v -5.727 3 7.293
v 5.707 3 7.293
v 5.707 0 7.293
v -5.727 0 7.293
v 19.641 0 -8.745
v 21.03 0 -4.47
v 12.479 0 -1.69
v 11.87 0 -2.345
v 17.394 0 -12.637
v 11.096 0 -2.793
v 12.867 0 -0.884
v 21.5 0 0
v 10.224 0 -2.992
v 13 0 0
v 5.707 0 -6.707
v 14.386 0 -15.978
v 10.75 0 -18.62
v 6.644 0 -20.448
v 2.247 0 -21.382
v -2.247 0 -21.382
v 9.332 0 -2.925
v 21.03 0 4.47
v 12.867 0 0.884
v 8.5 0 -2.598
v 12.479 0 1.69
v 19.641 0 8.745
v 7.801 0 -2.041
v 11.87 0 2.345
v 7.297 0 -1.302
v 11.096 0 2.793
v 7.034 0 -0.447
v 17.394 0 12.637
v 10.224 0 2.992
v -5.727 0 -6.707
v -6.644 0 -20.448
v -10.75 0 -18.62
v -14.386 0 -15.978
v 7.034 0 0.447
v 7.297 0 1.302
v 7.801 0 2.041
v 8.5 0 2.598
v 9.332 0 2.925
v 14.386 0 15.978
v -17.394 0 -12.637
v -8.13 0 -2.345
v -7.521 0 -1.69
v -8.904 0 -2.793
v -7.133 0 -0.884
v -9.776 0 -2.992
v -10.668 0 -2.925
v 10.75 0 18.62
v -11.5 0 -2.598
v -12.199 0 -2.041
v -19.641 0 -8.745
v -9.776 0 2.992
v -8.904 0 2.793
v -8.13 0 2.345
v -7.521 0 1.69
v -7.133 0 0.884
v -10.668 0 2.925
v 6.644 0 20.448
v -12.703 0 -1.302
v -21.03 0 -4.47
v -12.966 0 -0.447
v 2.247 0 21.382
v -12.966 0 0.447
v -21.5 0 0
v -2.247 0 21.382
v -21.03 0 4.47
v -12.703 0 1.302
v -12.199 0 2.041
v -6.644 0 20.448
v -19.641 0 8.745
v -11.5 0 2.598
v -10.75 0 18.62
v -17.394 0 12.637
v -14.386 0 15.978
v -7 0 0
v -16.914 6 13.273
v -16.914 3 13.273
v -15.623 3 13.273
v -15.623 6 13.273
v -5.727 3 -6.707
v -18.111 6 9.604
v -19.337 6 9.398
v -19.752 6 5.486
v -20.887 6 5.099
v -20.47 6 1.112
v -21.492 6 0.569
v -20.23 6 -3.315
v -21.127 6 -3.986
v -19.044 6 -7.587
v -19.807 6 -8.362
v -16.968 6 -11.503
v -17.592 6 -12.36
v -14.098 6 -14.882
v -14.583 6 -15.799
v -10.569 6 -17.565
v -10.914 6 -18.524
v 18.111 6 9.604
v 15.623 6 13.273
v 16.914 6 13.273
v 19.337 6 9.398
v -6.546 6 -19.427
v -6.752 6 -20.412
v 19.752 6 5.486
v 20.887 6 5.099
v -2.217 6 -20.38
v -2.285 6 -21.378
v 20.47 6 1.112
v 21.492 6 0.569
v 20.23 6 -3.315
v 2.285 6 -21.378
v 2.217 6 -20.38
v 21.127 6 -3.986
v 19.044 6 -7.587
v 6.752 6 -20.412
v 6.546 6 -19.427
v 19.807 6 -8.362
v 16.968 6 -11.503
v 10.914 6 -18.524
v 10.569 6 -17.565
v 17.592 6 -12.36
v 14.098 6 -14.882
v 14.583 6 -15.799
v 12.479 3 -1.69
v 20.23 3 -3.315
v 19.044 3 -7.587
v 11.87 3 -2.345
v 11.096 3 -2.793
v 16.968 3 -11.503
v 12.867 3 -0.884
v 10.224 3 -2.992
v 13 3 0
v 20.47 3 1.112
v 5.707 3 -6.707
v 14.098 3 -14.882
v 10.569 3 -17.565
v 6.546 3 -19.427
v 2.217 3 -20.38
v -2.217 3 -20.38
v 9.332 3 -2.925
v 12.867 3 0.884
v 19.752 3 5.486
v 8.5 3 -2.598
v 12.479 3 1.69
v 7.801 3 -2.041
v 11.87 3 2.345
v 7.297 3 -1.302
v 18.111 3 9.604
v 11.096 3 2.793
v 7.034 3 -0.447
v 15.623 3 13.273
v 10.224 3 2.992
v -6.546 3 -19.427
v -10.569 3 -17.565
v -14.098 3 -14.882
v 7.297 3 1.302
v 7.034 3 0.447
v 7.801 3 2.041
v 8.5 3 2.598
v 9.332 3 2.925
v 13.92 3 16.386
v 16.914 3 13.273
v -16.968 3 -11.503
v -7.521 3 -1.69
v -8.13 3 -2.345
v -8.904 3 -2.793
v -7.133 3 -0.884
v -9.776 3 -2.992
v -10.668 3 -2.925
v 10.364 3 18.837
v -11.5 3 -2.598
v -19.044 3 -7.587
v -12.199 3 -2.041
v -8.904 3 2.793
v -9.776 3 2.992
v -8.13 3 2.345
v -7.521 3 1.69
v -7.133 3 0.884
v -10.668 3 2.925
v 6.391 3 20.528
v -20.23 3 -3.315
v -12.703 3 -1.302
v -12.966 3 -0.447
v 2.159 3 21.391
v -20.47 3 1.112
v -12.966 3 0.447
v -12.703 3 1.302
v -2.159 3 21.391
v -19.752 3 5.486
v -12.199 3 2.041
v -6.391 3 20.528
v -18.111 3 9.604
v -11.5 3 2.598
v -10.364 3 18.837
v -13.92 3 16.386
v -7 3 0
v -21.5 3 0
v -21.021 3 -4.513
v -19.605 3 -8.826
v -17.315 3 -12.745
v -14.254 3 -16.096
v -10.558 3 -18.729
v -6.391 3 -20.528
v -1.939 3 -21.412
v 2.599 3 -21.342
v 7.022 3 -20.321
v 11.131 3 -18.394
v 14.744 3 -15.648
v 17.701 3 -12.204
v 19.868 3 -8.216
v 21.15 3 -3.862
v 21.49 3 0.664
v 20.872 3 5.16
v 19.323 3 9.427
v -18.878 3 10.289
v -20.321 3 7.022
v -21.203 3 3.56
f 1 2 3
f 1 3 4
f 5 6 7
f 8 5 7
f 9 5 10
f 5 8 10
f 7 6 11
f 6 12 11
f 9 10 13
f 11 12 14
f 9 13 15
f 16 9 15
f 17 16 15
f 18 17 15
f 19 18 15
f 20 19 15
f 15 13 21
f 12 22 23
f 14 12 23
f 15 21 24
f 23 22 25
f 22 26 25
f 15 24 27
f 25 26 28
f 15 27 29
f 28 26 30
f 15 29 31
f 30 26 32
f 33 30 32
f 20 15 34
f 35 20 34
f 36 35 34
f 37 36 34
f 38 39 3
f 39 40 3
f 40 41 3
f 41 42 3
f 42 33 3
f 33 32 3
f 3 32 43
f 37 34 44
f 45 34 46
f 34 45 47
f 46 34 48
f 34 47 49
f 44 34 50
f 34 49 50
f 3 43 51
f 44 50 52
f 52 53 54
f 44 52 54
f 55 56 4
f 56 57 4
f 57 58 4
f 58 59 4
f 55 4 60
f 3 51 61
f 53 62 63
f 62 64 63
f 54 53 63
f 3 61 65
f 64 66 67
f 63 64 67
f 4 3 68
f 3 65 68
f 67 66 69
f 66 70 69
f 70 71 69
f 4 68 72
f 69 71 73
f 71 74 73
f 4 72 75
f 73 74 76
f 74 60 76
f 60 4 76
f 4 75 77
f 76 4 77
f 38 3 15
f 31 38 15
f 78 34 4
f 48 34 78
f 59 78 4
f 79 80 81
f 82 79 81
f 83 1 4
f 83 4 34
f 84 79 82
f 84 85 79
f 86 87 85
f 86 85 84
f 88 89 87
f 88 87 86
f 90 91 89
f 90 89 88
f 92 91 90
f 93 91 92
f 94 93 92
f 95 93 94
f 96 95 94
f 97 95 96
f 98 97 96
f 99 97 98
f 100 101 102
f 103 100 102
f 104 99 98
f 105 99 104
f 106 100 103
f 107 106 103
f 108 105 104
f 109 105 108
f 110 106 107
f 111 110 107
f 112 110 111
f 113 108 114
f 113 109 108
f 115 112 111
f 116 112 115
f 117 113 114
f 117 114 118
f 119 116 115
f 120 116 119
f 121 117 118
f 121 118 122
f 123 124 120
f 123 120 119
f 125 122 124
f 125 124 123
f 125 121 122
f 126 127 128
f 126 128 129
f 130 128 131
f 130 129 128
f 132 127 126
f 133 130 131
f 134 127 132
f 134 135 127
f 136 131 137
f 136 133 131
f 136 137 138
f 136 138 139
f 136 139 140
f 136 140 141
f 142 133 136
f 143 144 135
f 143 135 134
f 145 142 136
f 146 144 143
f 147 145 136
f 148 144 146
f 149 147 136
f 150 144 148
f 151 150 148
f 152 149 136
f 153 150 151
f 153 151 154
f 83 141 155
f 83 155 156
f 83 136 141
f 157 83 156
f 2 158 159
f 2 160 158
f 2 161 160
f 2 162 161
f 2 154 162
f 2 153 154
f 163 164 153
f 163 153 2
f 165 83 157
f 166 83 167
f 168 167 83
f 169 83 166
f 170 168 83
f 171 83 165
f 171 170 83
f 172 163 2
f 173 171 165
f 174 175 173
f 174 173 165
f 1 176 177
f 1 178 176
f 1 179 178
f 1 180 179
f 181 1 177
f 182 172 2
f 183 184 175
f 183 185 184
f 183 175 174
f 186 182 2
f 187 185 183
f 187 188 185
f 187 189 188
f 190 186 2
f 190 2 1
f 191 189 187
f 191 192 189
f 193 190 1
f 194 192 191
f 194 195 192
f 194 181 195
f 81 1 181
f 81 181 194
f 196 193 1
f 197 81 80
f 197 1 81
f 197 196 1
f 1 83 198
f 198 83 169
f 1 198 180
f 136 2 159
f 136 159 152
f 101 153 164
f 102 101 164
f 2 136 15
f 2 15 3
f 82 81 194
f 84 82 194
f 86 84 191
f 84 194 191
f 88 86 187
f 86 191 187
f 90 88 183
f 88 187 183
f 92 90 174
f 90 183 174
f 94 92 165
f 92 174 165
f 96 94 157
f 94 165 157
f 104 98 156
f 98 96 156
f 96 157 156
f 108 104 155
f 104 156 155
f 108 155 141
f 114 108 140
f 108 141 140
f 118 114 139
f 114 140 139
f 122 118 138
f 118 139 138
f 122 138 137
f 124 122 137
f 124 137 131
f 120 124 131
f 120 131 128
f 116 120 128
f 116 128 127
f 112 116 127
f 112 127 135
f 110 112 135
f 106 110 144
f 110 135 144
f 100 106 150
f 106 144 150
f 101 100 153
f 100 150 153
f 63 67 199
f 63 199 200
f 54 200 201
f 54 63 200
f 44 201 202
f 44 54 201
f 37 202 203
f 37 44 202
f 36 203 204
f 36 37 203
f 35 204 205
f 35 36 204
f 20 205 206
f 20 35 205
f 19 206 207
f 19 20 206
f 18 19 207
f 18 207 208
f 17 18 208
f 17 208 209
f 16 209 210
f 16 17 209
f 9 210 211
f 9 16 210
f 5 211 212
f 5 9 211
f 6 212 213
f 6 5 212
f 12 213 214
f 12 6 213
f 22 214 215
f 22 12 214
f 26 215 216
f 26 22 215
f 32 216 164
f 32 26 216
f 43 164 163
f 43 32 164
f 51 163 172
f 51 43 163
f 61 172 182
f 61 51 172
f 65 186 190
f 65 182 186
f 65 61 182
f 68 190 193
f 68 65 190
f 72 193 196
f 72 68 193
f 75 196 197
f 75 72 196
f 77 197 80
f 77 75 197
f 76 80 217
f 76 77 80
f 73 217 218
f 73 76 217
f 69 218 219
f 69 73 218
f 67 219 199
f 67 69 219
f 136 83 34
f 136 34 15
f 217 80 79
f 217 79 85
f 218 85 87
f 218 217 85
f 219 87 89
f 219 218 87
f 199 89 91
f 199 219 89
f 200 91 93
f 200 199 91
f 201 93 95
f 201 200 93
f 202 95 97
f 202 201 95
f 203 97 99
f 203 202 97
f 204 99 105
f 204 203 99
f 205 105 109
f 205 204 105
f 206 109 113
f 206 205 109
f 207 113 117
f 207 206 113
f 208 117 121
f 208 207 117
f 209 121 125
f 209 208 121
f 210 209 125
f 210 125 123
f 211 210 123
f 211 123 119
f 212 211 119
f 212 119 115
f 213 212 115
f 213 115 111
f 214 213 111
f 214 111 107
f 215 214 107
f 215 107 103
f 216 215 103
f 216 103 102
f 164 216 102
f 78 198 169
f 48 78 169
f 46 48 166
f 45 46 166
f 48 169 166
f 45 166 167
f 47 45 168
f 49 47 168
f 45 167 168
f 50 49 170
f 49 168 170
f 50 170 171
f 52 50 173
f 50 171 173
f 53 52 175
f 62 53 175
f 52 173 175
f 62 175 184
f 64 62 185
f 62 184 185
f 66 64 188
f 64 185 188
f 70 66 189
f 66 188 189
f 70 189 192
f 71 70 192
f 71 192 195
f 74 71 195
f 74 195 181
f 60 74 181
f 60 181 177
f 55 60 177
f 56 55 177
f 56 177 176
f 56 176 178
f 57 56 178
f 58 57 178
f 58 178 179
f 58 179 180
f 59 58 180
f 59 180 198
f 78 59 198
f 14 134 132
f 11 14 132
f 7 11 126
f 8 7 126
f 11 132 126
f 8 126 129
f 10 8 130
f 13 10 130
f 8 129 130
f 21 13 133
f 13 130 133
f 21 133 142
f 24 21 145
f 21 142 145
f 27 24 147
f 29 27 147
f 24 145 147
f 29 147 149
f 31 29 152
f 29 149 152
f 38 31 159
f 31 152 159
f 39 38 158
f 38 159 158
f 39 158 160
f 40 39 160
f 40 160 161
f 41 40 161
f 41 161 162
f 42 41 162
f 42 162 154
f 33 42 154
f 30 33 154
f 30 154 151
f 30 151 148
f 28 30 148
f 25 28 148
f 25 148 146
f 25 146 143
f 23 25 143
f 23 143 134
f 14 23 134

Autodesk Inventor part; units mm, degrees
ref_plane "YZ Plane" through (0, 0, 0) normal (1, 0, 0) x (0, 1, 0)
ref_plane "XZ Plane" through (0, 0, 0) normal (0, 1, 0) x (-1, 0, 0)
ref_plane "XY Plane" through (0, 0, 0) normal (0, 0, 1) x (1, 0, 0)
sketch "Sketch1" plane through (0, 0, 0) normal (0, 1, 0) x (-1, 0, 0)
  circle A0 centre (0, 0) radius 21.5
  dimension "d1" = 43
extrude "Extrusion1" add sketch "Sketch1" along normal blind 3
sketch "Sketch2" plane through (0, 3, 0) normal (0, 1, 0) x (1, 0, 0)
  arc A0 (15.6228, -13.2732) -> (-15.6228, -13.2732) centre (0, 0) ccw
  arc A1 (16.9137, -13.2732) -> (-16.9137, -13.2732) centre (0, 0) ccw
  circle A2 centre (0, 0) radius 21.5 projected
  line L0 (-16.9137, -13.2732) -> (-15.6228, -13.2732)
  line L1 (15.6228, -13.2732) -> (16.9137, -13.2732)
  dimension "d4" = 41
extrude "Extrusion2" add sketch "Sketch2" along normal blind 3 contours A0 L0 A1 L1
sketch "Sketch3" plane through (0, 3, 0) normal (0, 1, 0) x (1, 0, 0)
  circle A0 centre (-10, 0) radius 3
  circle A1 centre (10, 0) radius 3
  point P0 (0, 0)
  dimension "d7" = 6
  dimension "d8" = 6
extrude "Extrusion3" cut sketch "Sketch3" against normal blind 10 contours A0
sketch "Sketch4" plane through (0, 3, 0) normal (0, 1, 0) x (1, 0, 0)
  circle A0 centre (10, 0) radius 3
  point P0 (0, 0)
  dimension "d11" = 6
extrude "Extrusion4" cut sketch "Sketch4" against normal blind 10
sketch "Sketch5" plane through (0, 3, 0) normal (0, 1, 0) x (1, 0, 0)
  line L0 (0, 6) -> (5, 6)
  line L1 (5, 6) -> (5, -6)
  line L2 (5, -6) -> (-5, -6)
  line L3 (-5, -6) -> (-5, 6)
  line L4 (-5, 6) -> (0, 6)
  point P0 (0, 0)
extrude "Extrusion5" cut sketch "Sketch5" against normal blind 10
sketch "Sketch6" plane through (0, 3, 0) normal (0, 1, 0) x (1, 0, 0)
  line L0 (5, 6) -> (5.7071, 6.7071)
  line L1 (5, 6) -> (6, 6) construction
  line L2 (5.7071, 6.7071) -> (5.7071, -7.2929)
  line L3 (5.7071, -7.2929) -> (-5.7269, -7.2929)
  line L4 (-5.7269, -7.2929) -> (-5.7269, 6.7071)
  line L5 (-5.7269, 6.7071) -> (5.7071, 6.7071)
  point P0 (0, 0)
  dimension "d21" = 1
  dimension "d22" = 45
  dimension "d23" = 14
  dimension "d24" = 45
extrude "Extrusion6" cut sketch "Sketch6" against normal blind 10
properties part number "EndCapProper"
